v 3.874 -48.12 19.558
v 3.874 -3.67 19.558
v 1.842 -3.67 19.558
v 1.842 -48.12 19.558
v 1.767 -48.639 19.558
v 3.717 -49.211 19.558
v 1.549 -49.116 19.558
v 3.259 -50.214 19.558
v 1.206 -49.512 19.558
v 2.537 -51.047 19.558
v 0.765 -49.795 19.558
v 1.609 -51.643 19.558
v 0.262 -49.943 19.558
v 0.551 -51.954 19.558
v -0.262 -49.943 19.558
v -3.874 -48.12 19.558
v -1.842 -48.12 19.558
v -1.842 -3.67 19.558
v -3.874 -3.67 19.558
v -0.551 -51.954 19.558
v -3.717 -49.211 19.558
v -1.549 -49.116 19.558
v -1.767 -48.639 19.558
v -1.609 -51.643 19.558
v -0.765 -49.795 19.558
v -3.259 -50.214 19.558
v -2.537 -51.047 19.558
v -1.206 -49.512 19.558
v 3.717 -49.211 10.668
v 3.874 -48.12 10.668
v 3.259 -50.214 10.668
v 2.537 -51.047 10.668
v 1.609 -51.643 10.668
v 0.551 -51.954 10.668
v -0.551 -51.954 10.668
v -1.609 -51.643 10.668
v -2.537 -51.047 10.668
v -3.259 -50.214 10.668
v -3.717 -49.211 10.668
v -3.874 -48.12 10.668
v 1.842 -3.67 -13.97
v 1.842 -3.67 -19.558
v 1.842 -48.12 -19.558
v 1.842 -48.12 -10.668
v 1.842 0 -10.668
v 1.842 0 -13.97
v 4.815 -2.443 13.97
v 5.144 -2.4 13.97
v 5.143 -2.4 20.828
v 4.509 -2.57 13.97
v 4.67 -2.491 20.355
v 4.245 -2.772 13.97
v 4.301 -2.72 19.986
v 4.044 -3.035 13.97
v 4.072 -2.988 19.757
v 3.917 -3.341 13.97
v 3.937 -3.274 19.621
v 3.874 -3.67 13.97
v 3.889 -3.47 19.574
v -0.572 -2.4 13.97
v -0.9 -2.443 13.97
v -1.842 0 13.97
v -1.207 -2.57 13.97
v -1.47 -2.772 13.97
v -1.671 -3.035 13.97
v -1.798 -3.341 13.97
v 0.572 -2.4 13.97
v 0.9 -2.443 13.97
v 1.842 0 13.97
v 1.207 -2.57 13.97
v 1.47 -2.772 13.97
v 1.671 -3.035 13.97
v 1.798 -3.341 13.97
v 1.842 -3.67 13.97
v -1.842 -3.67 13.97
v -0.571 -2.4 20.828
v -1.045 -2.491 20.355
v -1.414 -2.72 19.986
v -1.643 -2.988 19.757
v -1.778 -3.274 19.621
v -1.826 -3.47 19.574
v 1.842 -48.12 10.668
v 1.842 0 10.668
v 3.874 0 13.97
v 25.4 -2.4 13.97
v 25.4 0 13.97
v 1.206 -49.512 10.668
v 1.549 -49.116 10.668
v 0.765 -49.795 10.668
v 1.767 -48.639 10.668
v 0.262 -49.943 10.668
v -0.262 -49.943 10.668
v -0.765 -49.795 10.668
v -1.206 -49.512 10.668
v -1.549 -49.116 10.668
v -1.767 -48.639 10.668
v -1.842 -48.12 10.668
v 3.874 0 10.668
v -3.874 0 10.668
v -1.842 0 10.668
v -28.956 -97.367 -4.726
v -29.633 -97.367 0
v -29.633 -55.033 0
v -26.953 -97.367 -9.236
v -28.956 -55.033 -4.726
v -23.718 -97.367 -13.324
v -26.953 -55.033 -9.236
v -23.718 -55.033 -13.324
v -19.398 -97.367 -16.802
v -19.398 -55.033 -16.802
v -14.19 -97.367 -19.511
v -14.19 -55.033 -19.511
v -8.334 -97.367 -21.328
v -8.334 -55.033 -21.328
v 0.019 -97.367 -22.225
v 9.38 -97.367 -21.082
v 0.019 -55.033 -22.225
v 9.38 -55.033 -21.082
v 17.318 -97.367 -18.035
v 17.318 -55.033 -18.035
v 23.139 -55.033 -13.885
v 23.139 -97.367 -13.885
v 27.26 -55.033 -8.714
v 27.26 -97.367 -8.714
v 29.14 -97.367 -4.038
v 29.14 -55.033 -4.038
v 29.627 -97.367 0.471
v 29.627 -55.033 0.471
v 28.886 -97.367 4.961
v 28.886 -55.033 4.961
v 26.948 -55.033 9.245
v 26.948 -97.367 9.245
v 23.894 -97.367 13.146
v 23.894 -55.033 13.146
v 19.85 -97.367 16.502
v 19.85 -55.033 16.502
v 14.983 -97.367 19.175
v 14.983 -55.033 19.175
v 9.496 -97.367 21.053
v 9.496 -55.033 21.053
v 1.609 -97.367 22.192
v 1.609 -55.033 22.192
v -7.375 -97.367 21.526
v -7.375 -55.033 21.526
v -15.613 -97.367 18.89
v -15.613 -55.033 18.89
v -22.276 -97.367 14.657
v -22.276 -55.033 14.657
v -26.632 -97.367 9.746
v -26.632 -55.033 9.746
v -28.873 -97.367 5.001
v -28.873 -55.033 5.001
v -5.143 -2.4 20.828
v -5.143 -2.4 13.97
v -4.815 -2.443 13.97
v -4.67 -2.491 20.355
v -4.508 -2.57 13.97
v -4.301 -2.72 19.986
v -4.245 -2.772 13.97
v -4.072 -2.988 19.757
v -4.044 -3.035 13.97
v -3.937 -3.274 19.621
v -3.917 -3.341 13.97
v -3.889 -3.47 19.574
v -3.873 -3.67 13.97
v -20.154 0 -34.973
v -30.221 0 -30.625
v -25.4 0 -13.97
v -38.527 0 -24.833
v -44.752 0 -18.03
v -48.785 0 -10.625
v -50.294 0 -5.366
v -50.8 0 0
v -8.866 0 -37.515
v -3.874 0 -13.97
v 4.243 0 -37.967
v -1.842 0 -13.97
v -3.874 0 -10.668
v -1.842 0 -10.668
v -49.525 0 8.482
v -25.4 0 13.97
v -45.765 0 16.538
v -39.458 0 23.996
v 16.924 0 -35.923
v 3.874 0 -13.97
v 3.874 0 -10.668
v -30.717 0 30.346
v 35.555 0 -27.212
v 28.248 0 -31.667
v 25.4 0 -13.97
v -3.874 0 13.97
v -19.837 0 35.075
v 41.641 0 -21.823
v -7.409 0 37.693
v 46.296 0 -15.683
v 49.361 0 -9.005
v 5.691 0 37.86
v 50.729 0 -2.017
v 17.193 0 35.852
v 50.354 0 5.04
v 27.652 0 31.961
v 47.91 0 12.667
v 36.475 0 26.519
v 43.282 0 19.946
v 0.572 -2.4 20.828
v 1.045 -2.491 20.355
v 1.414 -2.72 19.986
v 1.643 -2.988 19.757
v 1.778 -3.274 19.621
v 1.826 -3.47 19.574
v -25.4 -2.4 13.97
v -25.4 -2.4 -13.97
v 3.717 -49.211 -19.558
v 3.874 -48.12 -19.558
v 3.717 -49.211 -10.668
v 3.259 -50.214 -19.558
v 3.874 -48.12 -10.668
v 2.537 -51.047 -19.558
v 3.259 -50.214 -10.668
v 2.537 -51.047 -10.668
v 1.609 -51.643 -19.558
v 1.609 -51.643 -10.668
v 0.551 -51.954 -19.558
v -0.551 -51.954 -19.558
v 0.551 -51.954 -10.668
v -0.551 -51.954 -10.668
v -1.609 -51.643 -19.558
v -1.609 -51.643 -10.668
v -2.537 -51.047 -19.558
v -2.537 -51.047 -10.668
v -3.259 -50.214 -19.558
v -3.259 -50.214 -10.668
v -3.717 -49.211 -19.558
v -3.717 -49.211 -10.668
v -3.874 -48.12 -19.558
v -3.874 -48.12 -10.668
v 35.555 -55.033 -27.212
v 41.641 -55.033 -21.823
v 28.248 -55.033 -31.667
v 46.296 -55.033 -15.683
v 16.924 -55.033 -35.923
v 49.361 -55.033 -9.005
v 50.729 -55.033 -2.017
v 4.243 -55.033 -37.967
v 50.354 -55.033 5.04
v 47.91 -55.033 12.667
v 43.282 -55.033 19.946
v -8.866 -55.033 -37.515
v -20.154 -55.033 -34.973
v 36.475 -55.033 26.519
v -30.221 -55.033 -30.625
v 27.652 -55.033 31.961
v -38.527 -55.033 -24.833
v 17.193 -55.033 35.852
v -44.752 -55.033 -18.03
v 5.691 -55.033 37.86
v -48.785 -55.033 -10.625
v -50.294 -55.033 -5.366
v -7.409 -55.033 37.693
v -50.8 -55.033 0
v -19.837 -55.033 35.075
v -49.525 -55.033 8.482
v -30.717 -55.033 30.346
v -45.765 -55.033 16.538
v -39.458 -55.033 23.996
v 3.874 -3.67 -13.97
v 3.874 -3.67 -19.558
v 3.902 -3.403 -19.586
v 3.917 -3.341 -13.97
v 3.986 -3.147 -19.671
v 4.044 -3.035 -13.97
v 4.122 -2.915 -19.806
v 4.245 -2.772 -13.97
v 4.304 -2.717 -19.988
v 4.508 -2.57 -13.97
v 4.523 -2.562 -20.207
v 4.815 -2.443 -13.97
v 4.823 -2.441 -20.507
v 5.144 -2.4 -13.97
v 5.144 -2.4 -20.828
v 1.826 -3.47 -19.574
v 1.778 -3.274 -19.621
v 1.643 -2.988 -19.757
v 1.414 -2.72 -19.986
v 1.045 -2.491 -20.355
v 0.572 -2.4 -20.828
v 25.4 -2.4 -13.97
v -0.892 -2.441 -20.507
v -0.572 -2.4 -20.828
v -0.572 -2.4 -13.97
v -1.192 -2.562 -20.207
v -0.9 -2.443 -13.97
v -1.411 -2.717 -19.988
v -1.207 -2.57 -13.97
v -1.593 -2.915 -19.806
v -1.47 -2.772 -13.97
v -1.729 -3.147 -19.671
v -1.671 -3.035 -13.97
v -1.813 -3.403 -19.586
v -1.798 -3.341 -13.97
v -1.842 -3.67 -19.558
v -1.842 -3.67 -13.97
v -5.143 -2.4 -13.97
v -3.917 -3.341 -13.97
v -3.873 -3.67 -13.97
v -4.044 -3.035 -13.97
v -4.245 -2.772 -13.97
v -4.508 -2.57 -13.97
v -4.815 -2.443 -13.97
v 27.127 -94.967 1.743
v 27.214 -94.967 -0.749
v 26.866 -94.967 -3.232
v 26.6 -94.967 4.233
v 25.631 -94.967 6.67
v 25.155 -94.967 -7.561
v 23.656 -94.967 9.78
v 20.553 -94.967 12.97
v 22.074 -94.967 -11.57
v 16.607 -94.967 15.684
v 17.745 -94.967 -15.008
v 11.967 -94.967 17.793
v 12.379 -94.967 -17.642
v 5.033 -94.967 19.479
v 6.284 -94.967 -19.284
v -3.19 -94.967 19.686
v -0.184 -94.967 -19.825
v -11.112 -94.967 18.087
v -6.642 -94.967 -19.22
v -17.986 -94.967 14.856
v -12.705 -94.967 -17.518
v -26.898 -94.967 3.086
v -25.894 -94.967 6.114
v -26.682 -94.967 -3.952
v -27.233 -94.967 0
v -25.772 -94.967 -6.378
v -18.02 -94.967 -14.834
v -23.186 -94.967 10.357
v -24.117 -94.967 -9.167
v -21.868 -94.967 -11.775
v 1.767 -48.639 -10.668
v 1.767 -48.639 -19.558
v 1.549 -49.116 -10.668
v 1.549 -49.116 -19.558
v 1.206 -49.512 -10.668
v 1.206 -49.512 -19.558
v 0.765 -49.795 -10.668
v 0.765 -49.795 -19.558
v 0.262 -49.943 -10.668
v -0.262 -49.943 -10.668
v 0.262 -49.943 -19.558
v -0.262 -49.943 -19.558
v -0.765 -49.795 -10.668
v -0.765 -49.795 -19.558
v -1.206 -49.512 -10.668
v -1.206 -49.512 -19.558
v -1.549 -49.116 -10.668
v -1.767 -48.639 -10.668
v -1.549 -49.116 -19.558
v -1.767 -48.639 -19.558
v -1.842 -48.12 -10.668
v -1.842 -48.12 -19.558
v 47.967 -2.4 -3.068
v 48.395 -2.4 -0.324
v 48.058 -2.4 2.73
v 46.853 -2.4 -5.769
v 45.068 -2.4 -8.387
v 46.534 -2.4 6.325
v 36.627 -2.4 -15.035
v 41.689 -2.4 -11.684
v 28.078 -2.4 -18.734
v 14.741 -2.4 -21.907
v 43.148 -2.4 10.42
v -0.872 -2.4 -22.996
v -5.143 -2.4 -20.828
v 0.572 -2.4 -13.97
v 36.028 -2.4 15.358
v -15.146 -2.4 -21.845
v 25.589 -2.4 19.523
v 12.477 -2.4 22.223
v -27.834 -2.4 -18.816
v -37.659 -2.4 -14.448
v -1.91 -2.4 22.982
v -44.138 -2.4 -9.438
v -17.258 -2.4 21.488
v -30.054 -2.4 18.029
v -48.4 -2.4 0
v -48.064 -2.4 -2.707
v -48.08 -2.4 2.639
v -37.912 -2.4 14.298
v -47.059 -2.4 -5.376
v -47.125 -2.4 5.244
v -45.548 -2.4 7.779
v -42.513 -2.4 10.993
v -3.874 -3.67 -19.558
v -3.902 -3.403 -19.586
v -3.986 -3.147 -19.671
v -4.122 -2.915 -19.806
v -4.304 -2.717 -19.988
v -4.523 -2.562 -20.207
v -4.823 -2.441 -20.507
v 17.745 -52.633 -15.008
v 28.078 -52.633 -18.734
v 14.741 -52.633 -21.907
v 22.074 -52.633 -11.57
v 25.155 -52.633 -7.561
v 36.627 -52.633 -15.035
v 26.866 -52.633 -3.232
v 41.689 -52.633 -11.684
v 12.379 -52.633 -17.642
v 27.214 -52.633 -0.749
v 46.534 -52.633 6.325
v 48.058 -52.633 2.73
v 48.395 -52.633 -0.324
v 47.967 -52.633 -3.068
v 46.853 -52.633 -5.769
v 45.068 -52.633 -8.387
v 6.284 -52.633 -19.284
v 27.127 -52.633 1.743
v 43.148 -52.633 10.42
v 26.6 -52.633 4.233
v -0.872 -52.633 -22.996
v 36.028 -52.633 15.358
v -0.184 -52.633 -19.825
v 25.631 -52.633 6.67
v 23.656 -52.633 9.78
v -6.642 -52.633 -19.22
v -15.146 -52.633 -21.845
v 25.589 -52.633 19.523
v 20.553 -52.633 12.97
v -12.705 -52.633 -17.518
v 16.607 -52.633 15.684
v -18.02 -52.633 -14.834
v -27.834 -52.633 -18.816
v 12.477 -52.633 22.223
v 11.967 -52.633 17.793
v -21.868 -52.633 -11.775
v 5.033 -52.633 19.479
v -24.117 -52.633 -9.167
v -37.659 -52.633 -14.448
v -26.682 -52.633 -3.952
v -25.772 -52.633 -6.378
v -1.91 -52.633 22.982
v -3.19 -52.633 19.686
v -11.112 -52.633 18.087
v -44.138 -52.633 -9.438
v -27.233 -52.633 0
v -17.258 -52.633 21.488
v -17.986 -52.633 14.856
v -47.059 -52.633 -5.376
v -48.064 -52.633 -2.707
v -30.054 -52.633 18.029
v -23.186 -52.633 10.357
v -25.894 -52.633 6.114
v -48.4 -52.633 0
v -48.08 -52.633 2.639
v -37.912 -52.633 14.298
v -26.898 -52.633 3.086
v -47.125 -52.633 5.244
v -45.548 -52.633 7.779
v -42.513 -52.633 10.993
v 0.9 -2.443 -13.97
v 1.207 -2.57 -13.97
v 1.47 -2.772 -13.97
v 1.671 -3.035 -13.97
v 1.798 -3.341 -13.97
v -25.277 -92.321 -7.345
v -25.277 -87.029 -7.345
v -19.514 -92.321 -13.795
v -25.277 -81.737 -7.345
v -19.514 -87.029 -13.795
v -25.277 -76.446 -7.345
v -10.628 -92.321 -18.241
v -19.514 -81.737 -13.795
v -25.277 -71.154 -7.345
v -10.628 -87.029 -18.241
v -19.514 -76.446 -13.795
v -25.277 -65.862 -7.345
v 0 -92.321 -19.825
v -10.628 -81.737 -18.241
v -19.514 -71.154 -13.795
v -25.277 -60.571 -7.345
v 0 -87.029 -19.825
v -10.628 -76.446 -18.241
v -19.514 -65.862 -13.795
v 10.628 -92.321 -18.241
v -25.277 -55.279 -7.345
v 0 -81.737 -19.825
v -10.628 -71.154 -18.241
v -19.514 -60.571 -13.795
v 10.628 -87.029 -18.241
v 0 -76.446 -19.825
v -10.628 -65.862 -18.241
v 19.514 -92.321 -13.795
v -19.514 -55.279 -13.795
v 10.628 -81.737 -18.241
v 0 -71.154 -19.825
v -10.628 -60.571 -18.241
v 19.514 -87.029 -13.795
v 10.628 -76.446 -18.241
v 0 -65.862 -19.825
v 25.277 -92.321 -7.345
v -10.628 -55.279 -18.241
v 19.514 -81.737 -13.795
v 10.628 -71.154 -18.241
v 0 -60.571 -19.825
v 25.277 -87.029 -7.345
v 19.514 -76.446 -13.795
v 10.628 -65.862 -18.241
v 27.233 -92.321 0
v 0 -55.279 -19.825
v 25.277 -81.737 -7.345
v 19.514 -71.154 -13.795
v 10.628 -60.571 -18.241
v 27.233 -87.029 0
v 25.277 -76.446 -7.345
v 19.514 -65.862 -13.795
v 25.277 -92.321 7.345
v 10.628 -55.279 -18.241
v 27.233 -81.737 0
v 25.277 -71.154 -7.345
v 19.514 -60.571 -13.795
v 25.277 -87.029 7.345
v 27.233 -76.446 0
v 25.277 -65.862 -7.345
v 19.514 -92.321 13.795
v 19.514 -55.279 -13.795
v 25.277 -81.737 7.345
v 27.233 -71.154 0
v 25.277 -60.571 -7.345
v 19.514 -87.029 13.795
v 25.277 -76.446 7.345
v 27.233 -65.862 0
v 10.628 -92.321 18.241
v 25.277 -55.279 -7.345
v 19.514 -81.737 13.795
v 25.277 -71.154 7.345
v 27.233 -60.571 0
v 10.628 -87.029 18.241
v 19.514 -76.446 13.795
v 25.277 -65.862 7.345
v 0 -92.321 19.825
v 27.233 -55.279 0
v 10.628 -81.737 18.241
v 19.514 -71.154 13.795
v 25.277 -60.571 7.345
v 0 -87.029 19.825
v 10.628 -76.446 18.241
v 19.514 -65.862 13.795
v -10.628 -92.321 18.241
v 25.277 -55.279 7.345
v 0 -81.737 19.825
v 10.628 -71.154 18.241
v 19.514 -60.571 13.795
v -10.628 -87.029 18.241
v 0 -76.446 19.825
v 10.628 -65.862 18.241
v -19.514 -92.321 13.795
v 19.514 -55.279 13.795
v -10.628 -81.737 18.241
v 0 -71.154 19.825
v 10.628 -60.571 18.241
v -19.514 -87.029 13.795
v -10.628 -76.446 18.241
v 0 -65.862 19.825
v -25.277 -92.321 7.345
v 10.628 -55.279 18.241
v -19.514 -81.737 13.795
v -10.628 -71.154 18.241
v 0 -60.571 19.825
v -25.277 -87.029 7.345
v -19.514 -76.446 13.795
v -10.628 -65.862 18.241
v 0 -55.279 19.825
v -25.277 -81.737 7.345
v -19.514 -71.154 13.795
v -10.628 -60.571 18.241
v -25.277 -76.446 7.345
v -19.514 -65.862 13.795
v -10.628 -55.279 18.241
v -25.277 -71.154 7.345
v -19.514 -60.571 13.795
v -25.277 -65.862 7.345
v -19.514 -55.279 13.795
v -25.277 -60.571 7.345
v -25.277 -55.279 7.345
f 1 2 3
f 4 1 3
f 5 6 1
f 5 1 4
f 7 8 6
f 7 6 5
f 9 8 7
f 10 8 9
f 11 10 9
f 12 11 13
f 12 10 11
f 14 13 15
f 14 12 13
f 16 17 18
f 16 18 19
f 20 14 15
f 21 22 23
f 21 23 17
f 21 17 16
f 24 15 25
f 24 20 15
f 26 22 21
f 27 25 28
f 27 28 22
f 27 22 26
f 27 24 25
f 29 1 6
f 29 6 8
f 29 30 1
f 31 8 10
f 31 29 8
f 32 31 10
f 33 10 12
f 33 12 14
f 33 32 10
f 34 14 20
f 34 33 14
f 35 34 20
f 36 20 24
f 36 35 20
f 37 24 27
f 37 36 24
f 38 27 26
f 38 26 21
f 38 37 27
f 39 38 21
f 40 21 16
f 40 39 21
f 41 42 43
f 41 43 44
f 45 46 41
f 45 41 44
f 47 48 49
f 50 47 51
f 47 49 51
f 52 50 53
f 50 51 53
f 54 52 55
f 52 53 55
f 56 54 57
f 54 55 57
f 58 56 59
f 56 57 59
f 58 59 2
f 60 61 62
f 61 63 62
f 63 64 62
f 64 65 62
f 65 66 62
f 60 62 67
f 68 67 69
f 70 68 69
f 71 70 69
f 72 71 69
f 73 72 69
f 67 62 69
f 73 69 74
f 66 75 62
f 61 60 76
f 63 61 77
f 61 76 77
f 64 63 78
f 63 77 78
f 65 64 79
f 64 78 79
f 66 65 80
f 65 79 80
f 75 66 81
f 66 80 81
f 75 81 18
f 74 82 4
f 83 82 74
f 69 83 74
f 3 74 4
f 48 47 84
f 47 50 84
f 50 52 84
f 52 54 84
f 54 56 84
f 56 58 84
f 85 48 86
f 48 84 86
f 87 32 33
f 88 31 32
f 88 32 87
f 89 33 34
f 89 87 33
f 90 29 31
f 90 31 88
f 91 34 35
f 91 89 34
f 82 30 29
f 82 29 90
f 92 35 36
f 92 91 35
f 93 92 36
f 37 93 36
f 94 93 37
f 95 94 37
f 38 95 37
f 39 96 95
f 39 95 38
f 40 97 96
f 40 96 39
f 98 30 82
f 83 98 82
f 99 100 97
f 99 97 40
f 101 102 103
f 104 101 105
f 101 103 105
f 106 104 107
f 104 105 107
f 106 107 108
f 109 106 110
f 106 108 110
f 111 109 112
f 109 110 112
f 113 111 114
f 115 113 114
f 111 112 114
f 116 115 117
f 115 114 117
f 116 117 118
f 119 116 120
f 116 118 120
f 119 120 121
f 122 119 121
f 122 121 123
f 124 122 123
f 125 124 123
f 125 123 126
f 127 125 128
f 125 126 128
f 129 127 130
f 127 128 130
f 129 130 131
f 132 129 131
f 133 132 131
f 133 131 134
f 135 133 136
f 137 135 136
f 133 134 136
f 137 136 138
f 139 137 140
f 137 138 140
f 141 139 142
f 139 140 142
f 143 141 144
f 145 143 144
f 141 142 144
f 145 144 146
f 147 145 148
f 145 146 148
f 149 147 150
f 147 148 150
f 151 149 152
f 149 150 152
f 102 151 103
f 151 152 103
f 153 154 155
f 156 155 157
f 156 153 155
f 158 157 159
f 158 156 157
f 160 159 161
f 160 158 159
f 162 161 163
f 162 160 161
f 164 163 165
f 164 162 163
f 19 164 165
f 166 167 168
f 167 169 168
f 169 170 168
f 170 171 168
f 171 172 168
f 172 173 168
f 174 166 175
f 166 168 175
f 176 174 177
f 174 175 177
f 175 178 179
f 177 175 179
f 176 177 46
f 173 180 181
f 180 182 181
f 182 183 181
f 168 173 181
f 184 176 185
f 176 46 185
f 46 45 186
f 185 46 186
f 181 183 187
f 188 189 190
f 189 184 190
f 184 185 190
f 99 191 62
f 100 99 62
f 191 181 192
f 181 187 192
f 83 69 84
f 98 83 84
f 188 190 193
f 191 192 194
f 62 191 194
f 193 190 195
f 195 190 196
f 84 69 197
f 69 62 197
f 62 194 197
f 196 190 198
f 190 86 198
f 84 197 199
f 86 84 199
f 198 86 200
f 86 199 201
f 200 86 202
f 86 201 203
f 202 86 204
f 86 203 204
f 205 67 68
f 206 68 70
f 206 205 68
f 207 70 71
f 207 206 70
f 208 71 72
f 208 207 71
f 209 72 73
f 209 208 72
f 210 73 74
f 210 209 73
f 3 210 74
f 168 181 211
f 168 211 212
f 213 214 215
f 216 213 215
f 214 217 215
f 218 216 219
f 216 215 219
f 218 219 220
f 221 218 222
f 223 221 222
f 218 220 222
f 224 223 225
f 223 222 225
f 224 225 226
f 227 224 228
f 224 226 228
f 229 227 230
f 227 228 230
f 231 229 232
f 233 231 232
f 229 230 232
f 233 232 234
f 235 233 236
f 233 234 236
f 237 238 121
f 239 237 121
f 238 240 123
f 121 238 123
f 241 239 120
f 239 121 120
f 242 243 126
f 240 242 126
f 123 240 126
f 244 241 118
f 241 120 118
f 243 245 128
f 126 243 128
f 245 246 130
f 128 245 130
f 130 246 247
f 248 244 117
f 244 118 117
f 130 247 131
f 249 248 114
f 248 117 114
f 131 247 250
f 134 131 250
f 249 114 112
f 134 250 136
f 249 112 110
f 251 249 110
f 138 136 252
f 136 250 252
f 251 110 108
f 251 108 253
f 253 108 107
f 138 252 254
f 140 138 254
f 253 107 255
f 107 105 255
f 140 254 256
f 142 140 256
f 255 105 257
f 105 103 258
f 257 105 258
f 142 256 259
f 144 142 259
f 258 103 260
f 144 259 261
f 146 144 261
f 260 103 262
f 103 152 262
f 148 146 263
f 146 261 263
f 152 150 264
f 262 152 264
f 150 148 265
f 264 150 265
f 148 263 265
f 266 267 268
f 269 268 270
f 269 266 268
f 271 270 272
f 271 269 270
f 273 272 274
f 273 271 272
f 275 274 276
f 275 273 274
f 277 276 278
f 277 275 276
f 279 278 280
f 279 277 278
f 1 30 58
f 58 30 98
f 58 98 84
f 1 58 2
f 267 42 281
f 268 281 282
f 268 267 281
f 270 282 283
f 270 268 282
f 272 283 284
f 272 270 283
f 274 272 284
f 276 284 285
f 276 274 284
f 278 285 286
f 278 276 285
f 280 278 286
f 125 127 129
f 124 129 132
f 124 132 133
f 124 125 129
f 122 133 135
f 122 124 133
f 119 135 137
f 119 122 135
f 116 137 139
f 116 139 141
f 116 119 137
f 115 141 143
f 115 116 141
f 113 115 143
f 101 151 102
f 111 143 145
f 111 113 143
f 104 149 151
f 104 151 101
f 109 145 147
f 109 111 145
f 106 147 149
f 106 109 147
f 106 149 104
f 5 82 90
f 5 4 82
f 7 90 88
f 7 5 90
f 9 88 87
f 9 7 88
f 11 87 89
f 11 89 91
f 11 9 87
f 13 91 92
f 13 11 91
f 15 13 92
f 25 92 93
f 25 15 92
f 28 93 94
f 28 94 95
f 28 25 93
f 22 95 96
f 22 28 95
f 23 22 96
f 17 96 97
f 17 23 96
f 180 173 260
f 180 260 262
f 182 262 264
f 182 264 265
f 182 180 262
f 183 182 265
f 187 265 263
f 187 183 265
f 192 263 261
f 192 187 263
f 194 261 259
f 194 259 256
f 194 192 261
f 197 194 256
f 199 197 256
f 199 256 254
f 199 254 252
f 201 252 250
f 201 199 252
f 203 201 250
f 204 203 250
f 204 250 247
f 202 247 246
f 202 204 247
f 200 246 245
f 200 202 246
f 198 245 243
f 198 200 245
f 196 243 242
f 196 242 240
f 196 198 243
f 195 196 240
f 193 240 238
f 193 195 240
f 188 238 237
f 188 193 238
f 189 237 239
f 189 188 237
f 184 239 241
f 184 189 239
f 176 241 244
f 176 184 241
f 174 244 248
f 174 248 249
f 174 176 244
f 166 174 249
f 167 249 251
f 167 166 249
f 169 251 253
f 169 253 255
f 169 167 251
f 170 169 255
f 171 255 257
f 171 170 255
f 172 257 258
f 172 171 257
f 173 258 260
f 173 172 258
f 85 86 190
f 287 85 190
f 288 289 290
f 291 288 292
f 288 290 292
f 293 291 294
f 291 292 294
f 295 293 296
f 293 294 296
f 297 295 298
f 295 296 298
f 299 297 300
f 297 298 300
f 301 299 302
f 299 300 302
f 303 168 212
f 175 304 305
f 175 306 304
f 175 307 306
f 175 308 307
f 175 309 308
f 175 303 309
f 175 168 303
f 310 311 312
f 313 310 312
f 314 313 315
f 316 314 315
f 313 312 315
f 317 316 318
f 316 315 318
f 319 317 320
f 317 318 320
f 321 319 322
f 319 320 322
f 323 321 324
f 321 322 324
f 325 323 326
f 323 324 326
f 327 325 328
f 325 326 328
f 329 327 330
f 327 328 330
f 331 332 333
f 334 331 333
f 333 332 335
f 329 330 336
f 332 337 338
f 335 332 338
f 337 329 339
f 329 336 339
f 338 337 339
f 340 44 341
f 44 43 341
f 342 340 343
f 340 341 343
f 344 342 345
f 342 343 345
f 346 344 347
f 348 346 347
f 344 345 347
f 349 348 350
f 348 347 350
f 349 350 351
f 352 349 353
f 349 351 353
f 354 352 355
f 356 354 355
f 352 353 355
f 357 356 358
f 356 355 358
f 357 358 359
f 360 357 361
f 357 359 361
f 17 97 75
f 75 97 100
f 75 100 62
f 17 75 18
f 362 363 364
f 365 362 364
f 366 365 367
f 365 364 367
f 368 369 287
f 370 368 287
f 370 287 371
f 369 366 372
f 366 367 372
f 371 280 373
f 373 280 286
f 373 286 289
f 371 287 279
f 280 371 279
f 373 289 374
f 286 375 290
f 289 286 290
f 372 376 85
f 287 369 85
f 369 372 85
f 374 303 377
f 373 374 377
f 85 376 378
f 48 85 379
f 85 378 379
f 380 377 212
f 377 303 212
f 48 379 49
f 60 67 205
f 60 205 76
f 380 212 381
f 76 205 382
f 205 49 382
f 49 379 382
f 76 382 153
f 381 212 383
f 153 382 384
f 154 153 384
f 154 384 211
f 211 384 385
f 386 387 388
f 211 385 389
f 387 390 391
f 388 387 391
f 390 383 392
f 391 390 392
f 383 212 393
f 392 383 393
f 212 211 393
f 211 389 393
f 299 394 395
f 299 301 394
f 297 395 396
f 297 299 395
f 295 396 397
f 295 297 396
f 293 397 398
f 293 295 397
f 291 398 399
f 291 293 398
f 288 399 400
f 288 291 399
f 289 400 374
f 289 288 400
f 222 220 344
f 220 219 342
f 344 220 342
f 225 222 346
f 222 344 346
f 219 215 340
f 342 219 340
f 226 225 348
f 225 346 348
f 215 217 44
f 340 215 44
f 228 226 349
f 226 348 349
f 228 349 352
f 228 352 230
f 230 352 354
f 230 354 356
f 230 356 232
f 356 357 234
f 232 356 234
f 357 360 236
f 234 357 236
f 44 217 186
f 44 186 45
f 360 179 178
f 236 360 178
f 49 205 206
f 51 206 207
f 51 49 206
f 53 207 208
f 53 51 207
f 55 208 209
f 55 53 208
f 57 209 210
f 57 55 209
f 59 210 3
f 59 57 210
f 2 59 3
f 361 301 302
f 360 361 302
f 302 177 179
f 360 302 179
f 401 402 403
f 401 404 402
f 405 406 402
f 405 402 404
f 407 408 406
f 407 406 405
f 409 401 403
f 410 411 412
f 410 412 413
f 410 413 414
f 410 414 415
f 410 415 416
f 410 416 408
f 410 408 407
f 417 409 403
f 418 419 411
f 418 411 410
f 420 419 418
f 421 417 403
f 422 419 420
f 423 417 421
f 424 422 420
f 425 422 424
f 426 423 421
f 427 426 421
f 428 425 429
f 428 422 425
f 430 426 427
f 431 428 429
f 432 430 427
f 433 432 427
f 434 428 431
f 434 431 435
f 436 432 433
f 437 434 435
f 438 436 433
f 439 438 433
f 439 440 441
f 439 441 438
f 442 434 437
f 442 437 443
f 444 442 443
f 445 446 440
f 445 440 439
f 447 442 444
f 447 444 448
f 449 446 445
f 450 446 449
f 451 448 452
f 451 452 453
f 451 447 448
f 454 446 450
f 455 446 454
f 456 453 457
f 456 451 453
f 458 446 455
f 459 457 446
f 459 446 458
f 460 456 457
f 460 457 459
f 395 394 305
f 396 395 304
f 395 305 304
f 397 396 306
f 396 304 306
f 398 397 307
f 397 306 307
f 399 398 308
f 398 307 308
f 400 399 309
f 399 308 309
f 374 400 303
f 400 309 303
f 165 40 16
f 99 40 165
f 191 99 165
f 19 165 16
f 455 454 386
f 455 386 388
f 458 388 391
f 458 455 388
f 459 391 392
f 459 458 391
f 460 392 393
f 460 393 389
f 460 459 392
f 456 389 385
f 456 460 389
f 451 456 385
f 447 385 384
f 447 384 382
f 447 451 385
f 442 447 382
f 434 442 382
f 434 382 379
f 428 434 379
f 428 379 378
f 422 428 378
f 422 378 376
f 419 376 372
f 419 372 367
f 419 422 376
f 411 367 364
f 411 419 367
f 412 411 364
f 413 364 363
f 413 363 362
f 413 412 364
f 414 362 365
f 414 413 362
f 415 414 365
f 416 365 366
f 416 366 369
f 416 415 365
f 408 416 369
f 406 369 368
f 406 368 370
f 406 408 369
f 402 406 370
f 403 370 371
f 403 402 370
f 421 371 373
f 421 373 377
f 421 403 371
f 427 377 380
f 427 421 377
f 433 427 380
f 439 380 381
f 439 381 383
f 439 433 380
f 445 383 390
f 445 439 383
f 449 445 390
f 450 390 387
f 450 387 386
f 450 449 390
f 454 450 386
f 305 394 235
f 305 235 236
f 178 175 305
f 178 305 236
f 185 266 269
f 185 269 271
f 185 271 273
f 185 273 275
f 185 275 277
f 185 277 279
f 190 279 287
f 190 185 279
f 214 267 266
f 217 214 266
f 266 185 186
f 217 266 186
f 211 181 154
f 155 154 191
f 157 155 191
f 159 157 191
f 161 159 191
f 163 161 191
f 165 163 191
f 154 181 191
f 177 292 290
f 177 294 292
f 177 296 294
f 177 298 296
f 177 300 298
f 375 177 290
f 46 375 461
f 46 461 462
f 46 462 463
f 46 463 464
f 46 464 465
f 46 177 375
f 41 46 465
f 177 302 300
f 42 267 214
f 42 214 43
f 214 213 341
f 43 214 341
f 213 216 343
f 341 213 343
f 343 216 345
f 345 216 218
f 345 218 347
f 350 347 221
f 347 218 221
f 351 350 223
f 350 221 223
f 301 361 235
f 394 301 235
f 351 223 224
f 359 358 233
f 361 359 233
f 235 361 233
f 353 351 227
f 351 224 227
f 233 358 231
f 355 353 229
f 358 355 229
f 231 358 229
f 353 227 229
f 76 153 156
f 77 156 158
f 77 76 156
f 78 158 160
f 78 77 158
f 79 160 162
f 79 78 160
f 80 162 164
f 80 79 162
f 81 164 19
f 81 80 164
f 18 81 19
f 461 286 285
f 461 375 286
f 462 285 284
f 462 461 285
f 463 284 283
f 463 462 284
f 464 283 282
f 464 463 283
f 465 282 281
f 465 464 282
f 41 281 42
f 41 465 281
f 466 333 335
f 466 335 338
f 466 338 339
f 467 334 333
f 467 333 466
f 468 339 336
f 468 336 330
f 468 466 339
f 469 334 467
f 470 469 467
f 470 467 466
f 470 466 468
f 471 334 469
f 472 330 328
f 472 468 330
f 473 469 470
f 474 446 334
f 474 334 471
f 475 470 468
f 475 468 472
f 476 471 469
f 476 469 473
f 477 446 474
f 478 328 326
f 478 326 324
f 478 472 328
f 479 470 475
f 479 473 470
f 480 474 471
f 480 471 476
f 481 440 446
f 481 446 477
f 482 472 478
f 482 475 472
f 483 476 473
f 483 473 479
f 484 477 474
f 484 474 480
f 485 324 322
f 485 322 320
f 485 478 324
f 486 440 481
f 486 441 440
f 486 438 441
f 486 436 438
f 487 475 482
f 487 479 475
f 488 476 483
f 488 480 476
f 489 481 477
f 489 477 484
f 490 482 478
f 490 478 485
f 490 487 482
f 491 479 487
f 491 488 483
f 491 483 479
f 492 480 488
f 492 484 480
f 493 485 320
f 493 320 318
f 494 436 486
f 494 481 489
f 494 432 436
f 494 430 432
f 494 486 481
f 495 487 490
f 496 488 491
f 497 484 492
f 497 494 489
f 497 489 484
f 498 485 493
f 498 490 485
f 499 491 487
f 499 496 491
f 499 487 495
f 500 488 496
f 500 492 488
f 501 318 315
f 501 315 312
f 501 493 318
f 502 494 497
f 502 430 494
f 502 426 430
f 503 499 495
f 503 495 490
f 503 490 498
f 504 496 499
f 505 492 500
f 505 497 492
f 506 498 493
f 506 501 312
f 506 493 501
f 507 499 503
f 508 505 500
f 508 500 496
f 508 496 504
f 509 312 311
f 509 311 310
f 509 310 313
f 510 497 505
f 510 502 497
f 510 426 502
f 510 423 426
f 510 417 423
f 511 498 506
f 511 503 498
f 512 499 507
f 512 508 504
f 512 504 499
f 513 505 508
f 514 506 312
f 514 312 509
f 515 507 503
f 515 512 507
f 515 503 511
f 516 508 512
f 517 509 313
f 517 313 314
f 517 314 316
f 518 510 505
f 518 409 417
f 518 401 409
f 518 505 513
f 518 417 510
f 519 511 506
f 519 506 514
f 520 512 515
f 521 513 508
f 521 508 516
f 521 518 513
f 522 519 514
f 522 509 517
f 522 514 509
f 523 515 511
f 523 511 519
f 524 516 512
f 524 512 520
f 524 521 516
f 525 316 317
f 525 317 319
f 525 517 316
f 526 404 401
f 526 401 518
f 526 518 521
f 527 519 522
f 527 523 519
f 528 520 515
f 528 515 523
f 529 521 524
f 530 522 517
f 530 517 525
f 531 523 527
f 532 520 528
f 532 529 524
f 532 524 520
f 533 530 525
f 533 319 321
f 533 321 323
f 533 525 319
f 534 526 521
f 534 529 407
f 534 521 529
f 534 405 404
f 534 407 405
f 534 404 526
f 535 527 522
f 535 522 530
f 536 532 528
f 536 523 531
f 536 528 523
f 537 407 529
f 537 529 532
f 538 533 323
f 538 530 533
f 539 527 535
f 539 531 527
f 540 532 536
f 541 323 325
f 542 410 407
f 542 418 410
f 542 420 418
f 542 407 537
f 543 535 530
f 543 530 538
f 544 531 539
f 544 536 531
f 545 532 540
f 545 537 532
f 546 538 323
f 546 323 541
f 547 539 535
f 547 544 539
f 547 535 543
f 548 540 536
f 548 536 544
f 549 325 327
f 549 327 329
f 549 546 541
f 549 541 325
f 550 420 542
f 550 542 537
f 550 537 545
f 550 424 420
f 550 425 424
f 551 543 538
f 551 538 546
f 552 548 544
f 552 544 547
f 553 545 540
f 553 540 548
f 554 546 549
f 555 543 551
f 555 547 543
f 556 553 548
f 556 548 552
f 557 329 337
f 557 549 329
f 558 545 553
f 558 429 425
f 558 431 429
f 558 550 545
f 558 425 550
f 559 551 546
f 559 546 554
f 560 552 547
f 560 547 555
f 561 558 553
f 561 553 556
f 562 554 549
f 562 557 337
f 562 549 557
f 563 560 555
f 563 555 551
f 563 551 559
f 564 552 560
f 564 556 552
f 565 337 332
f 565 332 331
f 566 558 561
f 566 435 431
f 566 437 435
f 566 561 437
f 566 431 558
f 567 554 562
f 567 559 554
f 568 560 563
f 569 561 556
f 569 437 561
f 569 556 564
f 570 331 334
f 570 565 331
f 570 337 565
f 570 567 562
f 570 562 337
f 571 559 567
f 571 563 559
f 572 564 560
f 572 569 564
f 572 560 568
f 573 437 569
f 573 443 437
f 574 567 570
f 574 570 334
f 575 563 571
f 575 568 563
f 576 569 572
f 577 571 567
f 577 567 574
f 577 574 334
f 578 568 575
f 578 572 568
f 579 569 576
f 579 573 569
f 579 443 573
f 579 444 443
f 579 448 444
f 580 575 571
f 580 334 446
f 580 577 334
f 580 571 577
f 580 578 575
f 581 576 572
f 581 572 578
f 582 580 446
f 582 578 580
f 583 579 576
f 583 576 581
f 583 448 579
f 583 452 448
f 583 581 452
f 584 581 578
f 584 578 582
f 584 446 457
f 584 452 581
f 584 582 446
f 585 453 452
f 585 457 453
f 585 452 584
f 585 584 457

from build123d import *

# Parameters (mm, degrees)
SKETCH3_RX          = 50.8
SKETCH3_RY          = 38.1
BOSS_EXTRUDE1_DEPTH = 55.033333333
SKETCH4_RX          = 29.633333333
SKETCH4_RY          = 22.224999873
BOSS_EXTRUDE2_DEPTH = 42.333333249
CUT_EXTRUDE1_START  = -50.233333
SKETCH5_RX          = 48.4
SKETCH5_RY          = 23
CUT_EXTRUDE1_DEPTH  = 50.233333
CUT_EXTRUDE2_START  = -42.333333249
CUT_EXTRUDE2_DEPTH  = 42.333333249
CUT_EXTRUDE3_REACH  = 118.243
SKETCH7_W           = 50.8
SKETCH7_H           = 27.94
BOSS_EXTRUDE3_START = -2.4
SKETCH8_W           = 2.032
SKETCH8_H           = 8.89
BOSS_EXTRUDE3_DEPTH = 48.12
SKETCH11_W          = 2.032
SKETCH11_H          = 8.89
FILLET1_R           = 1.27


# Read off the part's stored shape, not the designer's step: Cut-Extrude2
with BuildPart() as part:
    # Sketch3 → Boss-Extrude1 (new body)
    with BuildSketch(Plane(origin=(0, 0, 0), x_dir=(1, 0, 0), z_dir=(0, 1, 0))):
        with Locations(Location((0, 0), (0, 0, 180))):
            Ellipse(SKETCH3_RX, SKETCH3_RY)
    extrude(amount=-BOSS_EXTRUDE1_DEPTH)

    # Sketch4 → Boss-Extrude2 (add)
    with BuildSketch(Plane.XZ.offset(55.033333333)):
        with Locations(Location((0, 0), (0, 0, 180))):
            Ellipse(SKETCH4_RX, SKETCH4_RY)
    extrude(amount=BOSS_EXTRUDE2_DEPTH)

    # Sketch5 → Cut-Extrude1 (cut)
    with BuildSketch(Plane(origin=(0, -2.400000026, 0), x_dir=(1, 0, 0), z_dir=(0, 1, 0)).offset(CUT_EXTRUDE1_START)):
        with Locations(Location((0, 0), (0, 0, -180))):
            Ellipse(SKETCH5_RX, SKETCH5_RY)
    extrude(amount=CUT_EXTRUDE1_DEPTH, mode=Mode.SUBTRACT)

    # Cut-Extrude2 outline → Cut-Extrude2 (cut)
    with BuildSketch(Plane(origin=(0, -94.966666556, 0), x_dir=(-1, 0, 0), z_dir=(0, -1, 0)).offset(CUT_EXTRUDE2_START)):
        with BuildLine():
            add(Edge.make_bspline(
                [(27.233333333, 0), (27.233333333, 2.494186188), (25.929720695, 7.482558564), (20.056429993, 14.138870445), (10.928145061, 18.734648365), (0, 20.370175627), (-10.928145061, 18.734648365), (-20.056429993, 14.138870445), (-25.929720695, 7.482558564), (-27.885139653, 0), (-25.929720695, -7.482558564), (-20.056429993, -14.138870445), (-10.928145061, -18.734648365), (0, -20.370175627), (10.928145061, -18.734648365), (20.056429993, -14.138870445), (25.929720695, -7.482558564), (27.233333333, -2.494186188), (27.233333333, 0)],
                knots=[0, 0, 0, 0, 0.392699082, 0.785398163, 1.178097245, 1.570796327, 1.963495408, 2.35619449, 2.748893572, 3.141592654, 3.534291735, 3.926990817, 4.319689899, 4.71238898, 5.105088062, 5.497787144, 5.890486225, 6.283185307, 6.283185307, 6.283185307, 6.283185307], degree=3))
        make_face()
    extrude(amount=CUT_EXTRUDE2_DEPTH, mode=Mode.SUBTRACT)

    # Sketch7 → Cut-Extrude3 (cut, up to next)
    with BuildSketch(Plane(origin=(0, 0, 0), x_dir=(1, 0, 0), z_dir=(0, 1, 0)), mode=Mode.PRIVATE) as cut_extrude3_sk1:
        Rectangle(SKETCH7_W, SKETCH7_H)
    cut_extrude3_tool1 = extrude(cut_extrude3_sk1.sketch, amount=-CUT_EXTRUDE3_REACH, mode=Mode.PRIVATE) & part.part
    add(cut_extrude3_tool1.solids().sort_by_distance((0, 0, 0))[0], mode=Mode.SUBTRACT)

    # Sketch8 → Boss-Extrude3 (add)
    with BuildSketch(Plane.XZ.offset(2.400000026).offset(BOSS_EXTRUDE3_START)):
        with Locations((-2.8575, 15.113)):
            Rectangle(SKETCH8_W, SKETCH8_H)
        with Locations((2.8575, 15.113)):
            Rectangle(SKETCH8_W, SKETCH8_H)
        with Locations((2.8575, -15.113)):
            Rectangle(SKETCH8_W, SKETCH8_H)
        with Locations((-2.8575, -15.113)):
            Rectangle(SKETCH8_W, SKETCH8_H)
    extrude(amount=BOSS_EXTRUDE3_DEPTH)

    # Sweep2: sweep along a path in Sketch10
    with BuildLine(Plane(origin=(0, 0, 15.113), x_dir=(-1, 0, 0), z_dir=(0, 0, -1))) as sweep2_path:
        ThreePointArc((-2.8575, -48.120000026), (0, -50.977500026), (2.8575, -48.120000026))
    # Sketch11 → Sweep2 (sweep)
    with BuildSketch(Plane.XZ.offset(48.120000026)):
        with Locations((-2.8575, 15.113)):
            Rectangle(SKETCH11_W, SKETCH11_H)
    sweep2 = sweep(path=sweep2_path.line)

    # Mirror2: Sweep2 across plane
    add(sweep2.mirror(Plane.XY))

    # Fillet1
    fillet1_edges = [part.edges().sort_by_distance(p)[0] for p in [
        (-2.8575, -2.400000026, 19.558),
        (-3.8735, -2.400000026, 16.764),
        (-1.8415, -2.400000026, 16.764),
        (2.8575, -2.400000026, 19.558),
        (1.8415, -2.400000026, 16.764),
        (3.8735, -2.400000026, 16.764),
        (1.8415, -2.400000026, -16.764),
        (2.8575, -2.400000026, -19.558),
        (3.8735, -2.400000026, -16.764),
        (-2.8575, -2.400000026, -19.558),
        (-1.8415, -2.400000026, -16.764),
        (-3.8735, -2.400000026, -16.764),
    ]]
    fillet(fillet1_edges, radius=FILLET1_R)


solid = part.part
